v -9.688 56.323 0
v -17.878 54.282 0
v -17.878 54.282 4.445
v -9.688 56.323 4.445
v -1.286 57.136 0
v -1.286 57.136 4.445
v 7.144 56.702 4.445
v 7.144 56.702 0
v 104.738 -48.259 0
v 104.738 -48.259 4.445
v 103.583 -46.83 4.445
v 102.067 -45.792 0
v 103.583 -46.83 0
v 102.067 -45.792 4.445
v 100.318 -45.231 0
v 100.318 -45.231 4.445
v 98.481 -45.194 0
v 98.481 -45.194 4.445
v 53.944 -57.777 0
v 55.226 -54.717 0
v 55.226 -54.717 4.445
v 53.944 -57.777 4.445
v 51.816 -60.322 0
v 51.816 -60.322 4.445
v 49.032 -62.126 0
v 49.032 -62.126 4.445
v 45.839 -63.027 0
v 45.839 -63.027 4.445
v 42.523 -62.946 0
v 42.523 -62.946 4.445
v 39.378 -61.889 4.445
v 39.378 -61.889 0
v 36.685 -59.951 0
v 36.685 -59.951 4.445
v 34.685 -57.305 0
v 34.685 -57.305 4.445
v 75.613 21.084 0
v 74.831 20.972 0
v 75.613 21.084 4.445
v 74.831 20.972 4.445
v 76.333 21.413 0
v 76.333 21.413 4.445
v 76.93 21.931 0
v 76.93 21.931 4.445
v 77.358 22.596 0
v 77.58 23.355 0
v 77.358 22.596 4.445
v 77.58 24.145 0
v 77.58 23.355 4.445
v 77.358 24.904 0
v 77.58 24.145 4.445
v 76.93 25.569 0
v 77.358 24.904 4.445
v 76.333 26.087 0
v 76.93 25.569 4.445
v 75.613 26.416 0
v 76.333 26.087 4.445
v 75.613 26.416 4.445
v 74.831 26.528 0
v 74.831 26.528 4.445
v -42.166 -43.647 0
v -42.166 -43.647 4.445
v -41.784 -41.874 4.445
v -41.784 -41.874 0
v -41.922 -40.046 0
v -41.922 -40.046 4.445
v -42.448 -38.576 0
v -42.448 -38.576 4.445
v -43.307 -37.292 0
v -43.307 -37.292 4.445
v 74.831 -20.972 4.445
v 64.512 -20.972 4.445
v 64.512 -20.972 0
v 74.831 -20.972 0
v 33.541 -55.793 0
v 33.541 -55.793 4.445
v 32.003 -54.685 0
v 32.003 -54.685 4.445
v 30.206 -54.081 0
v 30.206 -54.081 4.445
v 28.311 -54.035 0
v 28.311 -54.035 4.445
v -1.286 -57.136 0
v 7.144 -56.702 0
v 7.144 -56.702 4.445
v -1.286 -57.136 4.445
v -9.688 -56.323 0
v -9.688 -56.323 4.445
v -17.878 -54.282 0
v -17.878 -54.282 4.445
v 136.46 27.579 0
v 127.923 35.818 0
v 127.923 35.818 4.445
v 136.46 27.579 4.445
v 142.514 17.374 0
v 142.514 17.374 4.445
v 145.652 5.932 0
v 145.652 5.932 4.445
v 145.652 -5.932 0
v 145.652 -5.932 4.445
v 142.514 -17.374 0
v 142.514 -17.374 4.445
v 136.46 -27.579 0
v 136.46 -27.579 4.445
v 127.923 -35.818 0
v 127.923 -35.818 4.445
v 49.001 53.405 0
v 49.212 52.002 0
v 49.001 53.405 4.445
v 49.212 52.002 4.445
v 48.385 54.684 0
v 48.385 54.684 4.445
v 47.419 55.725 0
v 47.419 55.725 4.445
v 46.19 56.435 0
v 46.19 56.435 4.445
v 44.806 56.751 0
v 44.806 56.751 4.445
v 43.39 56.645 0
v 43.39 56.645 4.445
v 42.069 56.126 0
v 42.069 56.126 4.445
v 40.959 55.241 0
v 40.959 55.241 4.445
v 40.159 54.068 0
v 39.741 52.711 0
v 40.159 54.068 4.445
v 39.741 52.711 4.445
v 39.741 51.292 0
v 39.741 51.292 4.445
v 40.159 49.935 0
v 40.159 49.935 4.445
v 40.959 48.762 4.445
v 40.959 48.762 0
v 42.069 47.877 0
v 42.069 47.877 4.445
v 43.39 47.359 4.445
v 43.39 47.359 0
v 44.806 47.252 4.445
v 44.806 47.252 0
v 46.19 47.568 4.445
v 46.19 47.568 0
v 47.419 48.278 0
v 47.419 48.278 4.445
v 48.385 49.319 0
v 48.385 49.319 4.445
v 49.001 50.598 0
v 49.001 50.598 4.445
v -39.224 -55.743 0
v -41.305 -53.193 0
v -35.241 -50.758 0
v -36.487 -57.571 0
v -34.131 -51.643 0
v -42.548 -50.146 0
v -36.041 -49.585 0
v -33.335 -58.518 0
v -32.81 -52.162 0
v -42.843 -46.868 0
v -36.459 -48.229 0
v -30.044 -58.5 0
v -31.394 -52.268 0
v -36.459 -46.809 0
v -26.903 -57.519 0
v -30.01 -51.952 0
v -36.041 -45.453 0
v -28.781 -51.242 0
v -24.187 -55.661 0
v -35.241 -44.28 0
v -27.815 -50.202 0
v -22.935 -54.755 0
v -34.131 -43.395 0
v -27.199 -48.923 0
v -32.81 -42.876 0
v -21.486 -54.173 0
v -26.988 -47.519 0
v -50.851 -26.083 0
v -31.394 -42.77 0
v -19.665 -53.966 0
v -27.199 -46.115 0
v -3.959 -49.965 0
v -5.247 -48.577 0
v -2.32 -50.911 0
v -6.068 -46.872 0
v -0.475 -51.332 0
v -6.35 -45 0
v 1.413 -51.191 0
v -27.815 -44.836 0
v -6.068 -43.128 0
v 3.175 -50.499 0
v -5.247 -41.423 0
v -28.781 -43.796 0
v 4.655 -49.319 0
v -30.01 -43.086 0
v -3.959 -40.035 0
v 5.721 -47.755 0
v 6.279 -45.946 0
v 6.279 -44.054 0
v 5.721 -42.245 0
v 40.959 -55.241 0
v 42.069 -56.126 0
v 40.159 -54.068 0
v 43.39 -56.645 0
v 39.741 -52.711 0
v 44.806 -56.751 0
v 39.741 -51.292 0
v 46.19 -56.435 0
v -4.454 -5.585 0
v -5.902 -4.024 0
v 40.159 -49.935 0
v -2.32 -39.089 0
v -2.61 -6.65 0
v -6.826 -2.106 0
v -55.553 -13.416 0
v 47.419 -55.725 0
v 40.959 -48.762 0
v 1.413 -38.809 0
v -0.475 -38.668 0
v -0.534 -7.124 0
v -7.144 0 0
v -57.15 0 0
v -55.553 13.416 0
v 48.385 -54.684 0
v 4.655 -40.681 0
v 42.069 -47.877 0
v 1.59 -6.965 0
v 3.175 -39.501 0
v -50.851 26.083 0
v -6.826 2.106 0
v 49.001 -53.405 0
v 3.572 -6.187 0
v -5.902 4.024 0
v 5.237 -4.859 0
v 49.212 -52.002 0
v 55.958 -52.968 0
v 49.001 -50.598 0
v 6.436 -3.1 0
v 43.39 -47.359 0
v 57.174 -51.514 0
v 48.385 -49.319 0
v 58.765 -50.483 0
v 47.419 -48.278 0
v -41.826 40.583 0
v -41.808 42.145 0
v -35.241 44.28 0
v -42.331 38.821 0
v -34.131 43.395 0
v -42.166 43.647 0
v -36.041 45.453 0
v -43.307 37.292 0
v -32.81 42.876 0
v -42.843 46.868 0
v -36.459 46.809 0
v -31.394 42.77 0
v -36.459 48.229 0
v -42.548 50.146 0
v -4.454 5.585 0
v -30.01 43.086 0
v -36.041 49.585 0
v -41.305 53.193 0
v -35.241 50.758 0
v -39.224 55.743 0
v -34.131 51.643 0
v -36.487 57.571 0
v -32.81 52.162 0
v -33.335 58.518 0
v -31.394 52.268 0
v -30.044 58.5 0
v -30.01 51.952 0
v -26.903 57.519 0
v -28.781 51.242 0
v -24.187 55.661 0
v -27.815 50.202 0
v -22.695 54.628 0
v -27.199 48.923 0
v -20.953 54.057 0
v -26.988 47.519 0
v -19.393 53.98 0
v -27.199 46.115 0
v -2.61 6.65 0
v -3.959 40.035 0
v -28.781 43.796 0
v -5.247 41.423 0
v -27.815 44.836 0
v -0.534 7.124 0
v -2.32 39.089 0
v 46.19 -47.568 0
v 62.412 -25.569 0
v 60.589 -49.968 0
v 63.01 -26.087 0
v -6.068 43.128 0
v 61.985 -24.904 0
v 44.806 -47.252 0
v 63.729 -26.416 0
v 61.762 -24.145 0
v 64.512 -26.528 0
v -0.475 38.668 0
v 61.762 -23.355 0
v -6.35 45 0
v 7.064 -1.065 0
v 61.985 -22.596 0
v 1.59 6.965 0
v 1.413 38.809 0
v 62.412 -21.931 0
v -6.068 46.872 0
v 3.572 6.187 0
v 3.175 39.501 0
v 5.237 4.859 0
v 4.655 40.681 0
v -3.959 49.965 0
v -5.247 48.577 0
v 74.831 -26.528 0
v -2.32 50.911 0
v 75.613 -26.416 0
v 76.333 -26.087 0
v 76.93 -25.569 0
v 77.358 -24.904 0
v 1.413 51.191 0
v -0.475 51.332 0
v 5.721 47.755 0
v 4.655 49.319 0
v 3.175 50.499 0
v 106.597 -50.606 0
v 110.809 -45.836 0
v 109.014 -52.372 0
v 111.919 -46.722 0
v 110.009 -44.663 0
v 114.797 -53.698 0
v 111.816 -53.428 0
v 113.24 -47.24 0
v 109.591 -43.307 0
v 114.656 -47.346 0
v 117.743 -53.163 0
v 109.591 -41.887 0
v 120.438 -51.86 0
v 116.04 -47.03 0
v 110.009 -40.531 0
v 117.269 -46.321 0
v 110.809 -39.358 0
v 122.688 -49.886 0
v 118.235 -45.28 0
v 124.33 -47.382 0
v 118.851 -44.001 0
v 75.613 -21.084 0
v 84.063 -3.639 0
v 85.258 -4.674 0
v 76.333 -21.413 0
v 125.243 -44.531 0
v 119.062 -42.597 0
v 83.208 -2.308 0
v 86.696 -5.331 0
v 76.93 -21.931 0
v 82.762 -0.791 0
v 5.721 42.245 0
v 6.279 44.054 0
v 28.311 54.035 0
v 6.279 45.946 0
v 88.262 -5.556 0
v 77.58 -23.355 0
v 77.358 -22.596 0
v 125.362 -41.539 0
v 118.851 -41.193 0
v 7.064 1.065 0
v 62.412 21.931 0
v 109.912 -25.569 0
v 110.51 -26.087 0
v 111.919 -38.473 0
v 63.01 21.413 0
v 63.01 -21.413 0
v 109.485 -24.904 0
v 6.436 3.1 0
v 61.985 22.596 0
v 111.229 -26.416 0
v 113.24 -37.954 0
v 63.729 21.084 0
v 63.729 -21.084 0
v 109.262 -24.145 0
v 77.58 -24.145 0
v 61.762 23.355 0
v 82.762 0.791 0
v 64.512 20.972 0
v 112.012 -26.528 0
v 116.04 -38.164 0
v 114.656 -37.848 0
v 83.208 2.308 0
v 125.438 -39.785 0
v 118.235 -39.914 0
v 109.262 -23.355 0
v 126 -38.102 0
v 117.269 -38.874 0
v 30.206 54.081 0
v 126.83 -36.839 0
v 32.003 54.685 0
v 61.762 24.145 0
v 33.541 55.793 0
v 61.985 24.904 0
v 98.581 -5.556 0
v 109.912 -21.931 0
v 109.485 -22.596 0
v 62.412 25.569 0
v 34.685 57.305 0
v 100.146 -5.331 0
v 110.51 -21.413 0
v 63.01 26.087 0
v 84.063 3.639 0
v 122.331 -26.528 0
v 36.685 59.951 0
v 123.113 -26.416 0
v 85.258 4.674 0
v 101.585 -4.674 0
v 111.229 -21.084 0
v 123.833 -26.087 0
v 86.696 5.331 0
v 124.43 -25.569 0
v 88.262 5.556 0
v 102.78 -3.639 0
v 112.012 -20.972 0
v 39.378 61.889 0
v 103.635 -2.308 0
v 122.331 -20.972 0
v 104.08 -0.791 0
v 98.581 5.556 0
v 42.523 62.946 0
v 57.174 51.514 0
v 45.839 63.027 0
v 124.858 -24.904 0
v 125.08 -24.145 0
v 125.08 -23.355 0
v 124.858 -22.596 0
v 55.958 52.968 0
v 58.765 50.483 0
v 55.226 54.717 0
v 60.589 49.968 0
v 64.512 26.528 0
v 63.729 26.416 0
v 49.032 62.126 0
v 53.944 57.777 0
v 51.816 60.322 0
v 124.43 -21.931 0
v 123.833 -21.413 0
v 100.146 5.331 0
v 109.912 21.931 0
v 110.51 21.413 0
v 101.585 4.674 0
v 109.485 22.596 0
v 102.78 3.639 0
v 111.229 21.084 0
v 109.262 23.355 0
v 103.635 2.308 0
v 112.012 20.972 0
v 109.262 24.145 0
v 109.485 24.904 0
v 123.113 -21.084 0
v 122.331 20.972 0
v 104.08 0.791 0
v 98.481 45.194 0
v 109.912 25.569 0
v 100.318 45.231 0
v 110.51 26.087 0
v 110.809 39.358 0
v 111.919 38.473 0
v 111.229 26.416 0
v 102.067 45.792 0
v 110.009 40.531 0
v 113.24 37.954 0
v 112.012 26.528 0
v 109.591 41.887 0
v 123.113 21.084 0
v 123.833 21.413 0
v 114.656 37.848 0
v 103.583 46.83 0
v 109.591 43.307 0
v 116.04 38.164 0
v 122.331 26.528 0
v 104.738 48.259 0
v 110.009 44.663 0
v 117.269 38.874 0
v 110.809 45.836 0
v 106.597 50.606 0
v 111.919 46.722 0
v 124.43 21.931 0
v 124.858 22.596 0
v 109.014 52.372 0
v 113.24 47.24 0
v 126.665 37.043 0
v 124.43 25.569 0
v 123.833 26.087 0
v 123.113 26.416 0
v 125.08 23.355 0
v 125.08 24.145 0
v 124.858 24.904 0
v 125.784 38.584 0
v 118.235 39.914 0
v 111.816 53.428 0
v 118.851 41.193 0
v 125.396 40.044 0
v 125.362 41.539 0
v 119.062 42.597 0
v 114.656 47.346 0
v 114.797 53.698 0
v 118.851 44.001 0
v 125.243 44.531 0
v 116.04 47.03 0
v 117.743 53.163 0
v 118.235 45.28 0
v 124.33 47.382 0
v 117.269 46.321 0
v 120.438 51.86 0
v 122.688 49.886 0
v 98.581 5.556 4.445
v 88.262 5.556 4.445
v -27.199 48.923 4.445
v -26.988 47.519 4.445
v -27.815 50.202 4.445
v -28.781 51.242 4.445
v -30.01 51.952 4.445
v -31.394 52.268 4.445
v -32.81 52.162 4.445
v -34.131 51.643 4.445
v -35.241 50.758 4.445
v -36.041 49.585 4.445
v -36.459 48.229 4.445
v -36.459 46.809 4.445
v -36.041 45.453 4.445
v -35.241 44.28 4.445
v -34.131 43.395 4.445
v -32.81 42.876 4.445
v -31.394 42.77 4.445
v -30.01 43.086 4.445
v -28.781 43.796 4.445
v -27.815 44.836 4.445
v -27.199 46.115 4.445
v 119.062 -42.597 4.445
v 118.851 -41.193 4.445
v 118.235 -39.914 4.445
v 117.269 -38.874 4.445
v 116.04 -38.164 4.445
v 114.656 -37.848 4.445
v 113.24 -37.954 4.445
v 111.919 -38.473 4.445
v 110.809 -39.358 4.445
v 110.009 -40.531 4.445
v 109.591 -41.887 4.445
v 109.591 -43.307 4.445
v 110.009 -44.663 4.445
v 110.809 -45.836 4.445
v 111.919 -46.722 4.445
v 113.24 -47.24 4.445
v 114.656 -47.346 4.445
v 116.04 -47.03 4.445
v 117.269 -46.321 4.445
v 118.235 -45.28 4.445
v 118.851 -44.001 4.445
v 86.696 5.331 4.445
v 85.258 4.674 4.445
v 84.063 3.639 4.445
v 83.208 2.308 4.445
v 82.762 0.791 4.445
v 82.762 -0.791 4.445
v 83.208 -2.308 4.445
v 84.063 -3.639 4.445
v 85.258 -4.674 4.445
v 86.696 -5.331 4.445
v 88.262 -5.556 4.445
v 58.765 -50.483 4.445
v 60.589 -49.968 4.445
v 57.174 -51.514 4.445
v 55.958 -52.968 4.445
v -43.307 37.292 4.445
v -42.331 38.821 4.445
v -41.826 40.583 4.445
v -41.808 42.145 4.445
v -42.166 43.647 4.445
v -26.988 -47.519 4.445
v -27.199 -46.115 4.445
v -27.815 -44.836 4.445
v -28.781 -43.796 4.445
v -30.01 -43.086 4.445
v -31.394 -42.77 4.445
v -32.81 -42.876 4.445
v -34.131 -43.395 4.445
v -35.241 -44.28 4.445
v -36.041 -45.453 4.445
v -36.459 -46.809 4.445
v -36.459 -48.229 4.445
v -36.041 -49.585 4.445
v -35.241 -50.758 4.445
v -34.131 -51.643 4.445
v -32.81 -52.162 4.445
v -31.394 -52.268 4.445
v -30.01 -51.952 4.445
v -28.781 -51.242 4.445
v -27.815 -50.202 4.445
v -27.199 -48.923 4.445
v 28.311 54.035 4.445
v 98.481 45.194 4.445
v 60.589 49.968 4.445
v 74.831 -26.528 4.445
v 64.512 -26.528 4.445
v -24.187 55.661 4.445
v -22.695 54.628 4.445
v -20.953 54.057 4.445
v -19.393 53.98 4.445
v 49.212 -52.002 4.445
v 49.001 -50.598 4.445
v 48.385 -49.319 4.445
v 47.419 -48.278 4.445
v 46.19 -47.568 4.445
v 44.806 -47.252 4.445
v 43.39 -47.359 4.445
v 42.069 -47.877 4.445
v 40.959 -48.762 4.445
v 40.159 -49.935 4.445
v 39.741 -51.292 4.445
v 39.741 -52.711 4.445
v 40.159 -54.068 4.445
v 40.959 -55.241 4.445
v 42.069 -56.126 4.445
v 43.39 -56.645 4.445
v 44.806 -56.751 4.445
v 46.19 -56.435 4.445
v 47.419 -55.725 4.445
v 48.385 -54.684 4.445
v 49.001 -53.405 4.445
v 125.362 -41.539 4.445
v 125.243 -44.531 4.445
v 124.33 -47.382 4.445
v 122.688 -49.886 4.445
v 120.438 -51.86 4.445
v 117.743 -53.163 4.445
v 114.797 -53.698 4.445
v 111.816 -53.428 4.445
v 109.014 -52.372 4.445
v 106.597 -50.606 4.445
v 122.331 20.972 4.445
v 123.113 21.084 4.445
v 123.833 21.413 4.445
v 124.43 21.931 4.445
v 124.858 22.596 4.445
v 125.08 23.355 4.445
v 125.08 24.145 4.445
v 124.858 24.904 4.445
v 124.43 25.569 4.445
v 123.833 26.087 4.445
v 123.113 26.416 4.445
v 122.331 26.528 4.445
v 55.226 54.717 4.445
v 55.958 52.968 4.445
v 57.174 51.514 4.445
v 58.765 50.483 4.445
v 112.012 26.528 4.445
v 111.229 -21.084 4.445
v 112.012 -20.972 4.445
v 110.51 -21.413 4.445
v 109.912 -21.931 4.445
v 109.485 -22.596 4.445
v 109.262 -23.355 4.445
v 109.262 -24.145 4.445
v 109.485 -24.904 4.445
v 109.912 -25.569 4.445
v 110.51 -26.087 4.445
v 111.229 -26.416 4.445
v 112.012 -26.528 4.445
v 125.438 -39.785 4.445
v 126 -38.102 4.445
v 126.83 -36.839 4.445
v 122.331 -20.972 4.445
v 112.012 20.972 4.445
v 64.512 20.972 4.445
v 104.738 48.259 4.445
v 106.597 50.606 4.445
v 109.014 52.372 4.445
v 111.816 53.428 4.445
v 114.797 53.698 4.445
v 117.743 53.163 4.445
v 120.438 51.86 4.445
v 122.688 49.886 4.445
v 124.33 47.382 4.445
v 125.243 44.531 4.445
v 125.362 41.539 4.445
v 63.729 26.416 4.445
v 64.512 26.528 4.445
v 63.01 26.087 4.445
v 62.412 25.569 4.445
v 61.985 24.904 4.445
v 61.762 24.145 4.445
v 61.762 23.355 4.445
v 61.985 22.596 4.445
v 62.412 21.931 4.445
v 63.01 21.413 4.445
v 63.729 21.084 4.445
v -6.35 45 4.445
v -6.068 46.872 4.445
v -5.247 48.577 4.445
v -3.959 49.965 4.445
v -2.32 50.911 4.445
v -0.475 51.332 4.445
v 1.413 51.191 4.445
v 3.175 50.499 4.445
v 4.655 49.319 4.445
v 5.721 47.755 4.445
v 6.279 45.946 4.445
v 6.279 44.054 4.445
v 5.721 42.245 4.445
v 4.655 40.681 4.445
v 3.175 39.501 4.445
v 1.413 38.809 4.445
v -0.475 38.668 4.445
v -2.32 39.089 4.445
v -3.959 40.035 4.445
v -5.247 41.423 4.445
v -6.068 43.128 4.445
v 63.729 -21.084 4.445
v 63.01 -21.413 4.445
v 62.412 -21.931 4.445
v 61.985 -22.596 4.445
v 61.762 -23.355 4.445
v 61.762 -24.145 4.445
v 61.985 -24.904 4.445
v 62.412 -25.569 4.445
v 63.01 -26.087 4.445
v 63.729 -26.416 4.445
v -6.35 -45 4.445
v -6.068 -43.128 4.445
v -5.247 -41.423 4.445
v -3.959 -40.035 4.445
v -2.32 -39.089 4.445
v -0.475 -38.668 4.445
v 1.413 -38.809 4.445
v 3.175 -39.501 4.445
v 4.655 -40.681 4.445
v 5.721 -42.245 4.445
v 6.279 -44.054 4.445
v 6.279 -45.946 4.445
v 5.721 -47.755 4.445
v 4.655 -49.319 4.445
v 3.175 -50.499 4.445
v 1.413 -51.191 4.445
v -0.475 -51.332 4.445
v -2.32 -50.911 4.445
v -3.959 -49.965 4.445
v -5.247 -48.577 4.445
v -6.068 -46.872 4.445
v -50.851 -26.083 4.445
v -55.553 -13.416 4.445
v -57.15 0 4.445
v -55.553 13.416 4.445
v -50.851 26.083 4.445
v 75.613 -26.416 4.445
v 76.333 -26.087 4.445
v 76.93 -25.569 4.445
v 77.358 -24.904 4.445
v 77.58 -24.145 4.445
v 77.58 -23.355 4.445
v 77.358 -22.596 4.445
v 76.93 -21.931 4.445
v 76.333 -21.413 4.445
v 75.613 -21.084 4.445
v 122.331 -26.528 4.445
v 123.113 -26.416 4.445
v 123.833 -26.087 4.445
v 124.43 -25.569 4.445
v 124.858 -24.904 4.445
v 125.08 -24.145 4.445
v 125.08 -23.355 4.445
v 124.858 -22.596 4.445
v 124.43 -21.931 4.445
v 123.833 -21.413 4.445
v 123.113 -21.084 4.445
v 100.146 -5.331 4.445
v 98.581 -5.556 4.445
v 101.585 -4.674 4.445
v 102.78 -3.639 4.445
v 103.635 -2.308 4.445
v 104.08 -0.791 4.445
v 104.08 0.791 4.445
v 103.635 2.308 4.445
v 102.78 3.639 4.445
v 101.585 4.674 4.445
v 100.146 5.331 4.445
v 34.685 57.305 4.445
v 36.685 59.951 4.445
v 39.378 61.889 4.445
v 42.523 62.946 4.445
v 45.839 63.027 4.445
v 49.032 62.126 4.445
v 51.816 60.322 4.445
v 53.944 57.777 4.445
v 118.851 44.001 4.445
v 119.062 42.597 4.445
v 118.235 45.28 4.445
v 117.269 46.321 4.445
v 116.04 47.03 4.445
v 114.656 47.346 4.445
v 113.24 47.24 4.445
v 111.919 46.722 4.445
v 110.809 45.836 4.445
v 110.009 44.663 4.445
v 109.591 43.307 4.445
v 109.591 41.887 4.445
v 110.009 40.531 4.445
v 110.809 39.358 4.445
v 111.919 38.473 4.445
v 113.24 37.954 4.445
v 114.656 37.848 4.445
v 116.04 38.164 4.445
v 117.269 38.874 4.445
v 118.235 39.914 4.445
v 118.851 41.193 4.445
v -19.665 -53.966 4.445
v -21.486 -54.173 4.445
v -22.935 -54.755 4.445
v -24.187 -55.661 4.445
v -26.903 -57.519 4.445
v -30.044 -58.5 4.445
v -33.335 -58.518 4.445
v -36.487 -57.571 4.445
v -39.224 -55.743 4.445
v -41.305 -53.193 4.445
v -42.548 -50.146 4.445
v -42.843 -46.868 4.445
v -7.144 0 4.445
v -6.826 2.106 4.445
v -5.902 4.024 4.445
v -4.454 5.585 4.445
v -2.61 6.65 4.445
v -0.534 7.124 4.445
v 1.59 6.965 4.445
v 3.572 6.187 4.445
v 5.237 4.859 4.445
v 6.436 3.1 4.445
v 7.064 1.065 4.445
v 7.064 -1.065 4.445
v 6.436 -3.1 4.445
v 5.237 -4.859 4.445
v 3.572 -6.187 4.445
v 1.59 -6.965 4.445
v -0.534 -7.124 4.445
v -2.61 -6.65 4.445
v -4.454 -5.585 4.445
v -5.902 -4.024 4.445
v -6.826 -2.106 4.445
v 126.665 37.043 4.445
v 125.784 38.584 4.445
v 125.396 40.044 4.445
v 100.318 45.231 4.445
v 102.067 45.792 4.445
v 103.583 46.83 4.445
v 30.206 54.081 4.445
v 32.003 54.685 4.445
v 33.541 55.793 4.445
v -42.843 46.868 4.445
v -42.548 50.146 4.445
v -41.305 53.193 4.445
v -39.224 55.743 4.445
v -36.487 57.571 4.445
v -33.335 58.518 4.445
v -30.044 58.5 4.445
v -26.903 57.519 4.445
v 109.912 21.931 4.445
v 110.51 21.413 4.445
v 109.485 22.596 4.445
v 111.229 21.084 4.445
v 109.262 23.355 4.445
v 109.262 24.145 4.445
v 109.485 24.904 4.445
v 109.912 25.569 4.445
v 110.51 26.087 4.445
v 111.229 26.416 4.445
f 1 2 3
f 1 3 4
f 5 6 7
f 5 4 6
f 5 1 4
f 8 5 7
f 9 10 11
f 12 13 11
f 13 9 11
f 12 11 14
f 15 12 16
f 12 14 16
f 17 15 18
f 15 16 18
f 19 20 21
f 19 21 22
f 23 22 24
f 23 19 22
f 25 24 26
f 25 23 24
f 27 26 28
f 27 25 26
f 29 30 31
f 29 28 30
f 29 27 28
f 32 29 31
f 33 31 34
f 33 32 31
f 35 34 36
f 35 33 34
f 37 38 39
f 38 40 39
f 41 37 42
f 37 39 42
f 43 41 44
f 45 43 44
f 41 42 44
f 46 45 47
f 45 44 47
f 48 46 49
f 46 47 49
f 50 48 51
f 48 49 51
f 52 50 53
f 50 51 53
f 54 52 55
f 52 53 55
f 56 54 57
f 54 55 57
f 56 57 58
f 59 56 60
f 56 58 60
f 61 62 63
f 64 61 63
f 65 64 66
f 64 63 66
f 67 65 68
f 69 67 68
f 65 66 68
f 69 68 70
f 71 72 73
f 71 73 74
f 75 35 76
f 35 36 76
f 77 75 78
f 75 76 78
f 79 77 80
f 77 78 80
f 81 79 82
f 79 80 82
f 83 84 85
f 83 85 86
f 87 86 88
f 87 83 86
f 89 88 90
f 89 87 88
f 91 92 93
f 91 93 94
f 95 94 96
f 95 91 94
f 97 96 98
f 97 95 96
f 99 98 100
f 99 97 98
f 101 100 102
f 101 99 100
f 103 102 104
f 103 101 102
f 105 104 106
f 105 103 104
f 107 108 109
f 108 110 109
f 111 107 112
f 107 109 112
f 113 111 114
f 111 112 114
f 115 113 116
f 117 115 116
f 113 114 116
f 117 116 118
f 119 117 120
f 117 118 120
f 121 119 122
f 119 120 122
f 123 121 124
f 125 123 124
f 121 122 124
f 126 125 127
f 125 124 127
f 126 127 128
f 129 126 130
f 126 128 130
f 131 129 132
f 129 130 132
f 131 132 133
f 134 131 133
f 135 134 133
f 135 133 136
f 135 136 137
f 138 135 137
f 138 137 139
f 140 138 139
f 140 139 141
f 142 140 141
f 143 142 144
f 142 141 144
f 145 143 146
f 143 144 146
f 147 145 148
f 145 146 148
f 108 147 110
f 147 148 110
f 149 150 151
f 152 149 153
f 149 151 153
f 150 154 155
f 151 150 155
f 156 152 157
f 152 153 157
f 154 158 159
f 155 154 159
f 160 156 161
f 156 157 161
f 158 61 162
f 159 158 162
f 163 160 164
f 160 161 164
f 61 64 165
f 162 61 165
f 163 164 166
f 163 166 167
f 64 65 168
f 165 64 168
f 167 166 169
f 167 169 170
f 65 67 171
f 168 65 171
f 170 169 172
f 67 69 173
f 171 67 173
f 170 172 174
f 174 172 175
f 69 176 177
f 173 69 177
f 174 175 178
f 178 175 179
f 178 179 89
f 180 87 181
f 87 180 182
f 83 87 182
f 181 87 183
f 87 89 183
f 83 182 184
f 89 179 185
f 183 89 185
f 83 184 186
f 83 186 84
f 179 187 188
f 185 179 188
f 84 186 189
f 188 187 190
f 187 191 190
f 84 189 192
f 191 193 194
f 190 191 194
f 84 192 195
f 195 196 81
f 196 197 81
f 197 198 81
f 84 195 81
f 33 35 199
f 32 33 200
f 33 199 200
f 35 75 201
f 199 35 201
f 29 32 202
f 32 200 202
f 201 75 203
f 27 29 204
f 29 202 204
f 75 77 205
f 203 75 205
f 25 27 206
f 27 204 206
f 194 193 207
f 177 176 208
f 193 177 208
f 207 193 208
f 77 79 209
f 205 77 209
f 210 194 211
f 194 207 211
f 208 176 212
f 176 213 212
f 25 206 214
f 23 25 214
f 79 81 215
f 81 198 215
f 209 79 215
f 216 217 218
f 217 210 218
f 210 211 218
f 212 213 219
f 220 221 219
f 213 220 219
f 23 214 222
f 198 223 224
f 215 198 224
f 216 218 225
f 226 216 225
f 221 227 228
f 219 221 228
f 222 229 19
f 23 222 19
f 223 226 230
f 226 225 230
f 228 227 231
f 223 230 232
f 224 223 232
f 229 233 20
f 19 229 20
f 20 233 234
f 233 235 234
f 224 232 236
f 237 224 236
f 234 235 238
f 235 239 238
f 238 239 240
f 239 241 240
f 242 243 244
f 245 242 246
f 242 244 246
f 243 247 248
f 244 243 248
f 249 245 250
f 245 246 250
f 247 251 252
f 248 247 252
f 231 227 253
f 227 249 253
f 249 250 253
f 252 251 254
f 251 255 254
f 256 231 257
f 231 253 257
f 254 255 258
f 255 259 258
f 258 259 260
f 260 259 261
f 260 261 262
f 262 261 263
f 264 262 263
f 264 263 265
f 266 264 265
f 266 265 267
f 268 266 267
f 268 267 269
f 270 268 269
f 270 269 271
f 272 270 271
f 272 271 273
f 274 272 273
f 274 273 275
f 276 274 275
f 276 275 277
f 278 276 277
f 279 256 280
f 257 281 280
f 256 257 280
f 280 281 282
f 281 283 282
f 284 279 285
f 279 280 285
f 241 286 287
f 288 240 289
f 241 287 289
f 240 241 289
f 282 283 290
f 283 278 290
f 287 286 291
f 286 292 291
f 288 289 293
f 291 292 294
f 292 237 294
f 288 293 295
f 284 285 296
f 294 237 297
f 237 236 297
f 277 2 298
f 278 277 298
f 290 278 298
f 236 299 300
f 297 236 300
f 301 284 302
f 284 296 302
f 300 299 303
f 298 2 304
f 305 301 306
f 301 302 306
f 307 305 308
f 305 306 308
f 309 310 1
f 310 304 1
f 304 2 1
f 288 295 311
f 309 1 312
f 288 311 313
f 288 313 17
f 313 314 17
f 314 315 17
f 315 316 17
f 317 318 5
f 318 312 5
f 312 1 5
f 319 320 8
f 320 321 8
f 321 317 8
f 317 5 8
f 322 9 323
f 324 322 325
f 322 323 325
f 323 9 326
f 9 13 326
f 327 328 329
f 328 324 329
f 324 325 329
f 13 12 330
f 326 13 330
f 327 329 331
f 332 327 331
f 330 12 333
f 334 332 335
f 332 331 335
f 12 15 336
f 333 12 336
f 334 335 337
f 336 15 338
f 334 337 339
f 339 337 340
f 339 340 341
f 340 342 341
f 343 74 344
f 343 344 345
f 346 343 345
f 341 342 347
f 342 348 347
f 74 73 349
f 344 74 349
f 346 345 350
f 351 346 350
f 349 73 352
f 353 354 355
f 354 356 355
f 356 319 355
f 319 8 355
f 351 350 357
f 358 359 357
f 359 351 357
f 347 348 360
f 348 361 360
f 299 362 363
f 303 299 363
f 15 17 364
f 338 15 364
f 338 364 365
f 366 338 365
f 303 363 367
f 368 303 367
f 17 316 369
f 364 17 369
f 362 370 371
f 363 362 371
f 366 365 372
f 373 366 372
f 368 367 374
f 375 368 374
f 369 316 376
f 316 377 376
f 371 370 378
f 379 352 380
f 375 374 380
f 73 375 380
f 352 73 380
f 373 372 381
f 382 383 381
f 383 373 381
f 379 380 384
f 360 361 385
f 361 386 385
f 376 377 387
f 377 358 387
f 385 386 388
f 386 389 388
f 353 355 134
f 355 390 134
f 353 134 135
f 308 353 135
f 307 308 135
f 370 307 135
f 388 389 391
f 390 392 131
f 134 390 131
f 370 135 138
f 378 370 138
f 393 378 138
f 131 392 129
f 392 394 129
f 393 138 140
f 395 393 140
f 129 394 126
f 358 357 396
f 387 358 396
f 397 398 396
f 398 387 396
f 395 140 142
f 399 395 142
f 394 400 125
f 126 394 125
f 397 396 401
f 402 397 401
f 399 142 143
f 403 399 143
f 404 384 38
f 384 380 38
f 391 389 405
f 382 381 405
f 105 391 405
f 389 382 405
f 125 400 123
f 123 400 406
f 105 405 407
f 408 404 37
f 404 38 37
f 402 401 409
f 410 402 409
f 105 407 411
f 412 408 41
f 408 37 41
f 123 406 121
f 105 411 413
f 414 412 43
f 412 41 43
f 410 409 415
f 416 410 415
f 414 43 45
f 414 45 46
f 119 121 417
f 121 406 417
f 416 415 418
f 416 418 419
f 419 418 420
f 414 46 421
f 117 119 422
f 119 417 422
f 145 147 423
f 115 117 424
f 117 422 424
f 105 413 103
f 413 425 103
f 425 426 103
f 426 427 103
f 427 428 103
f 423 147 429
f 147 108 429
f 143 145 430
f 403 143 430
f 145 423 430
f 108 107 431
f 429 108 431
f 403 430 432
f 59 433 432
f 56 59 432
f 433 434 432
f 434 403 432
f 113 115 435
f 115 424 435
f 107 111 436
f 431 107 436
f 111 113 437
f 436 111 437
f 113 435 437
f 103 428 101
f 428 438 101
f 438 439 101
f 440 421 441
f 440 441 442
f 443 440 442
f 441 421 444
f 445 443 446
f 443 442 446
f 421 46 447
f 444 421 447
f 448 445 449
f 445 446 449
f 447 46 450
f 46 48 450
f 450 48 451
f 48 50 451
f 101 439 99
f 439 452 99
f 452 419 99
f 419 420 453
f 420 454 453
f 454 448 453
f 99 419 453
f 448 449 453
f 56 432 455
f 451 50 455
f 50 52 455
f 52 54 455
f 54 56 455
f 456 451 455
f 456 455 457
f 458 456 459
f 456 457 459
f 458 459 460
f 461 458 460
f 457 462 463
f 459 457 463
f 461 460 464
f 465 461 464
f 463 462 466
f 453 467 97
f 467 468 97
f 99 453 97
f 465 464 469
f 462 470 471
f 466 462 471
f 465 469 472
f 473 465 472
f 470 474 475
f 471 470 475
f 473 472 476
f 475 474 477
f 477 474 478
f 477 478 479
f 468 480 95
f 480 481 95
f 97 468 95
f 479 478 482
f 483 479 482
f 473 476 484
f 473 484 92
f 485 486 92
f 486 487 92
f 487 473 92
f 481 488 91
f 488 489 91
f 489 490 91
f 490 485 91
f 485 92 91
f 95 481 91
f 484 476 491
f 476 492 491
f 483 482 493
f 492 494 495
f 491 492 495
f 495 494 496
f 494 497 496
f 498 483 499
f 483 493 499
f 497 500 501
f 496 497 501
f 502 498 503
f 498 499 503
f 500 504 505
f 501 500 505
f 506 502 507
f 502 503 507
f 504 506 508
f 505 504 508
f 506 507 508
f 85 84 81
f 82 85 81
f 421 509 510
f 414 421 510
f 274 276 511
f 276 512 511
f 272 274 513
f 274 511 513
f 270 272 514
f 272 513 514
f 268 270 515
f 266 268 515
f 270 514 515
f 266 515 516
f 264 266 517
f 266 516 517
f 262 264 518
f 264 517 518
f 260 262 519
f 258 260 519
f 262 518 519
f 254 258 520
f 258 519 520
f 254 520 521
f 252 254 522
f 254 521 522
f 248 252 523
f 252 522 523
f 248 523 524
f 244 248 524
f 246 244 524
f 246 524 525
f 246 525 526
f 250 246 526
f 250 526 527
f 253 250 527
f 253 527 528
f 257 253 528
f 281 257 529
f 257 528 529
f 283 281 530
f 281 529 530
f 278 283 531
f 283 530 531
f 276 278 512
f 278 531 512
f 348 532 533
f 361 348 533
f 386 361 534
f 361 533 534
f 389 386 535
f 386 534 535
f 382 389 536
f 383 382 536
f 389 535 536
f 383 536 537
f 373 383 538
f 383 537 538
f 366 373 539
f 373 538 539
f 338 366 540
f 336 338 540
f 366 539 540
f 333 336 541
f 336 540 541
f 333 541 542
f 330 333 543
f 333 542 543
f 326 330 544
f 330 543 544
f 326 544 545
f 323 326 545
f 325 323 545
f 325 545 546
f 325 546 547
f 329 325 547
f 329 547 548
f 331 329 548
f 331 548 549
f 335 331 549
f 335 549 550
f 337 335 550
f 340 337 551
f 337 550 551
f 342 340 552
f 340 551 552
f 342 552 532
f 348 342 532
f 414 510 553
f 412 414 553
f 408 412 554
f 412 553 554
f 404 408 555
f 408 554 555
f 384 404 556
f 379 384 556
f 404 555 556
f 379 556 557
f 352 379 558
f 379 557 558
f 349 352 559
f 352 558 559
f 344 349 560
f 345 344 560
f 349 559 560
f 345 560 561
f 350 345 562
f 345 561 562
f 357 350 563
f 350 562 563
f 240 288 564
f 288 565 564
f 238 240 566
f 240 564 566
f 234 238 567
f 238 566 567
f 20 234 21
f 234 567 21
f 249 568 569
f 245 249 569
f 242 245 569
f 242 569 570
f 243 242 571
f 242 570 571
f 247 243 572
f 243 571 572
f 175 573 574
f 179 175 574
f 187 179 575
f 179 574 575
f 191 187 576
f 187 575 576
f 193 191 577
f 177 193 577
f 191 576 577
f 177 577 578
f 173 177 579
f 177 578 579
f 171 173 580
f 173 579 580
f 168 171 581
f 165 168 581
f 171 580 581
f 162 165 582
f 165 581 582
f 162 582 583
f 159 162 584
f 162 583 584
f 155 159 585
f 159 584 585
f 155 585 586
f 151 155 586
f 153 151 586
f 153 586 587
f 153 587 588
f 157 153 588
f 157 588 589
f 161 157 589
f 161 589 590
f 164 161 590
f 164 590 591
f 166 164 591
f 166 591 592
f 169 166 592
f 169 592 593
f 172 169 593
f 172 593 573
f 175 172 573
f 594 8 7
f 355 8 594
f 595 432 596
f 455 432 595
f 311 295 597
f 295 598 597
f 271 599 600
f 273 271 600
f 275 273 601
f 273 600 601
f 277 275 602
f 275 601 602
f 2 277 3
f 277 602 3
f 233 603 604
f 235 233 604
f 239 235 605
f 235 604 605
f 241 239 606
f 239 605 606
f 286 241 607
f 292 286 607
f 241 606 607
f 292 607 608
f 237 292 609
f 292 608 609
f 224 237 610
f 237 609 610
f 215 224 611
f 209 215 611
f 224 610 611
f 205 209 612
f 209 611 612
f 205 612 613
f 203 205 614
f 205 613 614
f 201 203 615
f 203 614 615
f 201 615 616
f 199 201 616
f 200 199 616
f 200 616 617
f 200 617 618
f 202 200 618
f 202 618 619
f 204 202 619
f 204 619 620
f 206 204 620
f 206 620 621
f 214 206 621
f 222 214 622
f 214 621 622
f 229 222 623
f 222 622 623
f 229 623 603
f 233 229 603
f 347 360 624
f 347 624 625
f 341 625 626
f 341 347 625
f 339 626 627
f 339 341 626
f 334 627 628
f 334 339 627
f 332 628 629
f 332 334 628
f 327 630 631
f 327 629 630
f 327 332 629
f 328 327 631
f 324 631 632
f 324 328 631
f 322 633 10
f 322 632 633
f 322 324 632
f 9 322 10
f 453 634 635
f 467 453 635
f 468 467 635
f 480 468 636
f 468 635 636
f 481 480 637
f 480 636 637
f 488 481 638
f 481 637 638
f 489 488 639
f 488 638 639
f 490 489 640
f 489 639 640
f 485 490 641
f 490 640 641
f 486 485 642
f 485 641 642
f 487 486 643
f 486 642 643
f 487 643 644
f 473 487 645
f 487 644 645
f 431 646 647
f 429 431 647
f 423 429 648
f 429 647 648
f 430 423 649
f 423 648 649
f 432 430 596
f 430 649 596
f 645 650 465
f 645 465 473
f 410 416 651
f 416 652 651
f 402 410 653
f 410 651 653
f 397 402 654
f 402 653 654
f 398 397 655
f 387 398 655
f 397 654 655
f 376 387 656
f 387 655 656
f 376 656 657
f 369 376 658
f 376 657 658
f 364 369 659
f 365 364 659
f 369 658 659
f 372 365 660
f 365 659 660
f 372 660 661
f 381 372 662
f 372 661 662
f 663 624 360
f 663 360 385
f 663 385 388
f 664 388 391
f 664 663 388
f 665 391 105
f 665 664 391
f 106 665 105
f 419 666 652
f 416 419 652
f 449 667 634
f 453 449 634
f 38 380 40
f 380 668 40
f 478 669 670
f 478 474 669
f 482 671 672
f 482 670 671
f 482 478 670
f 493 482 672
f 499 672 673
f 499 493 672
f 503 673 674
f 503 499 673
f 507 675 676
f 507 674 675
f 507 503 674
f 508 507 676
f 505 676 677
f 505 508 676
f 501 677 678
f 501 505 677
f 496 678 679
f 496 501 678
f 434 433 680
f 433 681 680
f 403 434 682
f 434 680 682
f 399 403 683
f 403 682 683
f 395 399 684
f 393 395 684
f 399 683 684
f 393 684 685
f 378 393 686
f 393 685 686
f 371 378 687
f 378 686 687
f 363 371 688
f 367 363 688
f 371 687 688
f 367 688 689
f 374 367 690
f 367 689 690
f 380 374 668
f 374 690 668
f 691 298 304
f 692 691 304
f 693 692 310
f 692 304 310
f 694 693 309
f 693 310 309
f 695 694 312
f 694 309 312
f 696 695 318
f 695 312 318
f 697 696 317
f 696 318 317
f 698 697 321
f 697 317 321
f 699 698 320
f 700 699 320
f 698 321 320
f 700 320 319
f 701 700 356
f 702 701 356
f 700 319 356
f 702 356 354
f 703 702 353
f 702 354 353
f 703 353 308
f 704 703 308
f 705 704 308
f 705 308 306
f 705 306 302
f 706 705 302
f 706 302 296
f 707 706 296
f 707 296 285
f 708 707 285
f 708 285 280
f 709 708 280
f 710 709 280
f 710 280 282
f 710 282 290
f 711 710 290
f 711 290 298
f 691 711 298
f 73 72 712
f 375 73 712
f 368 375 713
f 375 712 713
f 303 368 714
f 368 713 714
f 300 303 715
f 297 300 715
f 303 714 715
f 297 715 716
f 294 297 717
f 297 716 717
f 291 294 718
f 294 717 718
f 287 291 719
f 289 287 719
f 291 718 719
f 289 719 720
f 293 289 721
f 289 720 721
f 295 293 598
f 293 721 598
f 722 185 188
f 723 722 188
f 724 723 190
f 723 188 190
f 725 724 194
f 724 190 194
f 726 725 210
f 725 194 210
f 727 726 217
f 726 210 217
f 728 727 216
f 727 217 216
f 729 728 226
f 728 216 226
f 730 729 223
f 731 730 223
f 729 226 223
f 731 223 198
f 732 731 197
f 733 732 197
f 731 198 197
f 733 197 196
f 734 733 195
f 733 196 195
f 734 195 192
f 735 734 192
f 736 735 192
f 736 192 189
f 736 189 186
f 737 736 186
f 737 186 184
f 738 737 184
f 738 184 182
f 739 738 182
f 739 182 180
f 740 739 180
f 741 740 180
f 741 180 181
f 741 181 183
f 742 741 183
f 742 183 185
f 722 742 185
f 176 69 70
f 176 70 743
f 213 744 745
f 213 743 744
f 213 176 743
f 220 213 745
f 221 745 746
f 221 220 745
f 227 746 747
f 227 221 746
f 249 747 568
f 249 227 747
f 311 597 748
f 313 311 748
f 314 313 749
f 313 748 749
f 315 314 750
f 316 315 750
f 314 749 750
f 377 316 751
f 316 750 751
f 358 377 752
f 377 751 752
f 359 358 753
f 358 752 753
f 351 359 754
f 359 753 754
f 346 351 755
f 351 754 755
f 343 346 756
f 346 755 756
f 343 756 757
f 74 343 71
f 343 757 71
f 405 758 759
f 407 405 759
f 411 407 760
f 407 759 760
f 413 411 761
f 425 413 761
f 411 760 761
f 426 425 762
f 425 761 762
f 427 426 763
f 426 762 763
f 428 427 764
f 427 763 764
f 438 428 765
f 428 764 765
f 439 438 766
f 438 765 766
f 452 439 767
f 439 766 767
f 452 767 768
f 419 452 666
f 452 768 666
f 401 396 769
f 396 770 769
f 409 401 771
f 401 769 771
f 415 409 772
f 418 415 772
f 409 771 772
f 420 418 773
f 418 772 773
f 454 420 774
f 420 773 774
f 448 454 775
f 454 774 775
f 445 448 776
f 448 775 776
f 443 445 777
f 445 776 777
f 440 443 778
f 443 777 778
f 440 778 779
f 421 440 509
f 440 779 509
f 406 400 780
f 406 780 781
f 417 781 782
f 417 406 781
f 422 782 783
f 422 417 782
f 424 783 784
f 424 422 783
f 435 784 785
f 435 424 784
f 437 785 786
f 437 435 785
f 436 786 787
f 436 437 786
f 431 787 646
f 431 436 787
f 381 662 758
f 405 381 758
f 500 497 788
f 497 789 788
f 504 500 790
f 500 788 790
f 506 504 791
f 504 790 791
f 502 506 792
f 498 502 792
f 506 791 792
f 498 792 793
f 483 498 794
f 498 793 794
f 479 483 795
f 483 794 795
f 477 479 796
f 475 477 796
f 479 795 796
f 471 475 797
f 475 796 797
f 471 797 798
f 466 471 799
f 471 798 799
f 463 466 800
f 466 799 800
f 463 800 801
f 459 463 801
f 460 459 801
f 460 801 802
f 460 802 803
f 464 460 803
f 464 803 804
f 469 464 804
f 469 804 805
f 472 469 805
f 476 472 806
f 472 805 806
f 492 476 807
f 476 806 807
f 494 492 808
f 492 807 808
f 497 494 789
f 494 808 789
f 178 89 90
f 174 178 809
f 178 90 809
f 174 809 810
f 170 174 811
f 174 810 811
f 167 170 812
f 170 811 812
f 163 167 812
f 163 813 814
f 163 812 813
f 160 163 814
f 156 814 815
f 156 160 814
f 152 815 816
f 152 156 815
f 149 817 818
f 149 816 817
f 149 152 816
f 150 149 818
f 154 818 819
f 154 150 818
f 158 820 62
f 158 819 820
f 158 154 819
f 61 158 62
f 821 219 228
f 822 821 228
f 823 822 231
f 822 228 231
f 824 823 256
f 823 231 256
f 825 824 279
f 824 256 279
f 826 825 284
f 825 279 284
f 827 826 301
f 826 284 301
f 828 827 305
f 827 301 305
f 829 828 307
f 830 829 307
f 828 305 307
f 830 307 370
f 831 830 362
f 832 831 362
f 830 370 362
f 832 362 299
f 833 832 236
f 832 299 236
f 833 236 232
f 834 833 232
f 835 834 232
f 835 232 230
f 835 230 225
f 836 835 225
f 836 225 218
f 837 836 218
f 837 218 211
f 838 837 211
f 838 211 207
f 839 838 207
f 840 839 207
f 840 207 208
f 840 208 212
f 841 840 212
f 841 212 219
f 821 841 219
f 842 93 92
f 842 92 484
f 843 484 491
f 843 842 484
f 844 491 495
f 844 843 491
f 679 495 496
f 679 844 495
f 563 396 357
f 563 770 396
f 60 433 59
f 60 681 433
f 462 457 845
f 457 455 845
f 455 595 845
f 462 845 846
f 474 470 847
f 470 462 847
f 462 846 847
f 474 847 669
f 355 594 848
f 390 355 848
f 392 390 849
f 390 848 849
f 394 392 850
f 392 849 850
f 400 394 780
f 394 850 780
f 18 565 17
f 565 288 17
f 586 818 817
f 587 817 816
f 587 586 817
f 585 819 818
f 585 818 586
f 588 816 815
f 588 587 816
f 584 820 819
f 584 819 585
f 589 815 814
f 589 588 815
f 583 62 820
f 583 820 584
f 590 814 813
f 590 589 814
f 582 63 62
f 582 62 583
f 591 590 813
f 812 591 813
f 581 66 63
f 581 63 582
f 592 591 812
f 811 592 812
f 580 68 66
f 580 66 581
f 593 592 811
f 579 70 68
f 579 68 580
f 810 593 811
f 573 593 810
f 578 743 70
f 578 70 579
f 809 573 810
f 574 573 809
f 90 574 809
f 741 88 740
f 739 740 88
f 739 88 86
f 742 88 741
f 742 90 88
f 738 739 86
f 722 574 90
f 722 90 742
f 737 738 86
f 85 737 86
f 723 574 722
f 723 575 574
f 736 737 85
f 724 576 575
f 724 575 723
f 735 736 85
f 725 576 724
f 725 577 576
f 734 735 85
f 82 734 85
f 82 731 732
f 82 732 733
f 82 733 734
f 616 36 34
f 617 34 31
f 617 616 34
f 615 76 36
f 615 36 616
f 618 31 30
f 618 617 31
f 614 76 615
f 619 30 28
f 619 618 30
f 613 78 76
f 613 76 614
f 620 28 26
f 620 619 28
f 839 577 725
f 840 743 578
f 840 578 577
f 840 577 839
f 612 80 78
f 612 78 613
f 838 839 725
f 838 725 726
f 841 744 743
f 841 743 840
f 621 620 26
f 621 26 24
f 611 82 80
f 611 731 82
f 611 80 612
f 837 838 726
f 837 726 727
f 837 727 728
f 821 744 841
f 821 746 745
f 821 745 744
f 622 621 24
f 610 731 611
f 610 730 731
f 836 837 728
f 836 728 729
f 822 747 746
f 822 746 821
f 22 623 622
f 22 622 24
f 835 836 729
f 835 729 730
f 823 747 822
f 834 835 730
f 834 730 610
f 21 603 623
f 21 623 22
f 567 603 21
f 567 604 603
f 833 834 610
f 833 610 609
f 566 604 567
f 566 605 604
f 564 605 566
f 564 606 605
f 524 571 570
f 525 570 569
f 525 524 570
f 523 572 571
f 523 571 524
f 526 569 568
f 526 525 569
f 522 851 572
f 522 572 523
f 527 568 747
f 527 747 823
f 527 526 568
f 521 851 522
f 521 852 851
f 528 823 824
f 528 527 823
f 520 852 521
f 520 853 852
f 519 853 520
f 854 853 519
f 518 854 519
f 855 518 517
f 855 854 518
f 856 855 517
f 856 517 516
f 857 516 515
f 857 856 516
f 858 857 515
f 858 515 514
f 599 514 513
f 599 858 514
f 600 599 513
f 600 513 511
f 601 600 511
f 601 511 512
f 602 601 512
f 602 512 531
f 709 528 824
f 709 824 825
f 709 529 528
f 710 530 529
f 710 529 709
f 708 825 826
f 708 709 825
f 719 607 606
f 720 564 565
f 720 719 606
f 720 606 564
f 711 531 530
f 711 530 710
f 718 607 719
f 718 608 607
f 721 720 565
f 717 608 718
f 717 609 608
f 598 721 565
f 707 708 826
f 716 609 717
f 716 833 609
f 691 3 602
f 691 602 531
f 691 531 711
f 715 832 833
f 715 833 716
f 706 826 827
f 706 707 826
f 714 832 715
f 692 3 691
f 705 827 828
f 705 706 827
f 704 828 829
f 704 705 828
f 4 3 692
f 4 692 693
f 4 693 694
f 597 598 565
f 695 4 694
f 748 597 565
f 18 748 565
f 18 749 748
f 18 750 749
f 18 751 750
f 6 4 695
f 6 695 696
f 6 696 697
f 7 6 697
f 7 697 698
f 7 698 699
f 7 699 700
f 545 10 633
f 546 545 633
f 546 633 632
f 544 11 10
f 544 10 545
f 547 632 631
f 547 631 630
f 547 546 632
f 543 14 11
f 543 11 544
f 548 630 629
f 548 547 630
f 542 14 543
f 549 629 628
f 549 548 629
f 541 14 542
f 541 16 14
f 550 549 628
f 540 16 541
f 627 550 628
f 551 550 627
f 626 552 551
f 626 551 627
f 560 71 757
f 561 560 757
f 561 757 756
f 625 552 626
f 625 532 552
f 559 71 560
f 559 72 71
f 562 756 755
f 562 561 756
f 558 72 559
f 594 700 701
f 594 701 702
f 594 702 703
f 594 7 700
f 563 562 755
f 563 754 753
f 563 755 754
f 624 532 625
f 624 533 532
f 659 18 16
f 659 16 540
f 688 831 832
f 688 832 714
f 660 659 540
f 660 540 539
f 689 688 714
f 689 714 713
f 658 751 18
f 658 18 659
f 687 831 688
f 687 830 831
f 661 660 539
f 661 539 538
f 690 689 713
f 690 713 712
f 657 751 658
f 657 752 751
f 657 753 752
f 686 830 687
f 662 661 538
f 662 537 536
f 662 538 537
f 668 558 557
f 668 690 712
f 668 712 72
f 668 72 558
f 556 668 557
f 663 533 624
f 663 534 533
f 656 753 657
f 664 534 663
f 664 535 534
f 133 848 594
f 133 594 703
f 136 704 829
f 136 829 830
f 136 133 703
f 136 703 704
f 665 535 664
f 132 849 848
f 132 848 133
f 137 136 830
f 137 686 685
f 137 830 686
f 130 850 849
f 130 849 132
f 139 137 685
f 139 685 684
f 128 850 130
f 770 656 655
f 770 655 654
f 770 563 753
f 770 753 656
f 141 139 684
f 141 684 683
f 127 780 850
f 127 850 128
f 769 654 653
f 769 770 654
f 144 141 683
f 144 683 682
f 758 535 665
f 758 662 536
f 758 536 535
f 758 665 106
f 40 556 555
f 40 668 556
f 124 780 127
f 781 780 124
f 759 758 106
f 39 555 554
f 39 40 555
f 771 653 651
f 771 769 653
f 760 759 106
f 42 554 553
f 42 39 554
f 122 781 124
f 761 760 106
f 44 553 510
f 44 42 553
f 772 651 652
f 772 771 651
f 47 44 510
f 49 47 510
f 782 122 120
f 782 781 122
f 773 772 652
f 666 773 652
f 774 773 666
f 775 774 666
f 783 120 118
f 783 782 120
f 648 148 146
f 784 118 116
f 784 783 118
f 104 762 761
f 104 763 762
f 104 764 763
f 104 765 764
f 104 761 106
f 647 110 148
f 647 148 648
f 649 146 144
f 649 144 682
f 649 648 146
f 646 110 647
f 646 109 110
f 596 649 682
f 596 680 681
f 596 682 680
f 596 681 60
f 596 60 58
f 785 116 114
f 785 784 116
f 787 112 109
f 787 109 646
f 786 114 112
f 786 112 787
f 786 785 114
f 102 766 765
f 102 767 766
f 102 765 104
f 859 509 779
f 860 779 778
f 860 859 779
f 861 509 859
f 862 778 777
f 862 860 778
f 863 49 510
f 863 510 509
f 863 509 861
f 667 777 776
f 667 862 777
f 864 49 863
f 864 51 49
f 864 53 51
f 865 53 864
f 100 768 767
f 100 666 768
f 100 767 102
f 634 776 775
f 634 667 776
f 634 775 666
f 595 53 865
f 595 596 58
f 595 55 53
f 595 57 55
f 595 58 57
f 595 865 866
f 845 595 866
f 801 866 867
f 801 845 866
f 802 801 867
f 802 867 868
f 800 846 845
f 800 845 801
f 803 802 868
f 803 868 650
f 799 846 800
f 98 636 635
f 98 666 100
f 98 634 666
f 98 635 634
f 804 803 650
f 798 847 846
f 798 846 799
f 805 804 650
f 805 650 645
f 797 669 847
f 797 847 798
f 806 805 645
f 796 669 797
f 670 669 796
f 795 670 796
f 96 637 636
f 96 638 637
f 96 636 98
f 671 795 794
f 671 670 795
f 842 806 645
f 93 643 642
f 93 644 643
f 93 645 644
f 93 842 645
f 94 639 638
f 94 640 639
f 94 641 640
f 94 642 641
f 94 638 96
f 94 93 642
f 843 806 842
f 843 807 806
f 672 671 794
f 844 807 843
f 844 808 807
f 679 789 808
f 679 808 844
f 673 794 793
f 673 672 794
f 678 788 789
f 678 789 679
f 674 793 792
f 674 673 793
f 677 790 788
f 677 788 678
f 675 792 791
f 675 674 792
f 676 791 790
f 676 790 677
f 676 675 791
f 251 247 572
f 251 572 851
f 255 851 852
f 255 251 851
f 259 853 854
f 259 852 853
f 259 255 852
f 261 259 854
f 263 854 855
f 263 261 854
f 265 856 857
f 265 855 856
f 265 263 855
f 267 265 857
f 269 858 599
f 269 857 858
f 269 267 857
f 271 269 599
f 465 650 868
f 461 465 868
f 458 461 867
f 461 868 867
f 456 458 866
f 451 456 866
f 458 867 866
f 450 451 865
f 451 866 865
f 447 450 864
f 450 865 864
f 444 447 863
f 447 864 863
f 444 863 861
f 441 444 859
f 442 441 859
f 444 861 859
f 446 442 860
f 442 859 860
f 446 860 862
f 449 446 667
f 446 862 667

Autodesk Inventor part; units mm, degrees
ref_plane "YZ Plane" through (0, 0, 0) normal (1, 0, 0) x (0, 1, 0)
ref_plane "XZ Plane" through (0, 0, 0) normal (0, 1, 0) x (-1, 0, 0)
ref_plane "XY Plane" through (0, 0, 0) normal (0, 0, 1) x (1, 0, 0)
sketch "Boceto1" plane through (0, 0, 0) normal (0, 0, 1) x (1, 0, 0)
  circle A0 centre (0, 0) radius 57.15
  circle A1 centre (101.6, 0) radius 44.45
  circle A2 centre (-31.75, 47.519) radius 11.1125
  circle A3 centre (-31.75, -47.519) radius 11.1125
  circle A4 centre (114.3, 42.5971) radius 11.1125
  circle A5 centre (114.3, -42.5971) radius 11.1125
  line L0 (7.1437, 56.7018) -> (107.1562, 44.1014)
  circle A6 centre (44.45, 52.0016) radius 11.1125
  line L1 (7.1437, -56.7018) -> (107.1562, -44.1014)
  circle A7 centre (44.45, -52.0016) radius 11.1125
  dimension "d0" = 114.3
  dimension "d1" = 88.9
  dimension "d2" = 203.2
  dimension "d3" = 22.225
  dimension "d4" = 22.225
  dimension "d7" = 22.225
  dimension "d8" = 22.225
  dimension "d11" = 22.225
  dimension "d13" = 0
  dimension "d14" = 22.225
  dimension "d27" = 12.7
  dimension "d28" = 12.7
  dimension "d29" = 44.45
  dimension "d30" = 44.45
  dimension "d31" = 31.75
  dimension "d32" = 31.75
extrude "Extrusión1" add sketch "Boceto1" along normal blind 4.445
sketch "Boceto2" plane through (0, 0, 4.445) normal (0, 0, 1) x (1, 0, 0)
  arc A0 (-21.9537, 52.7651) -> (-40.3458, 40.4764) centre (-31.75, 47.519) ccw projected
  circle A1 centre (-31.75, 47.519) radius 4.7625
  arc A2 (-40.3458, -40.4764) -> (-21.9537, -52.7651) centre (-31.75, -47.519) ccw projected
  circle A3 centre (-31.75, -47.519) radius 4.7625
  arc A4 (33.4247, -53.3907) -> (55.4753, -50.6125) centre (44.45, -52.0016) ccw projected
  circle A5 centre (44.45, -52.0016) radius 4.7625
  arc A6 (55.4753, 50.6125) -> (33.4247, 53.3907) centre (44.45, 52.0016) ccw projected
  circle A7 centre (44.45, 52.0016) radius 4.7625
  arc A8 (124.4689, 38.1158) -> (103.3657, 44.5789) centre (114.3, 42.5971) ccw projected
  circle A9 centre (114.3, 42.5971) radius 4.7625
  arc A10 (103.3657, -44.5789) -> (124.4689, -38.1158) centre (114.3, -42.5971) ccw projected
  circle A11 centre (114.3, -42.5971) radius 4.7625
  point P0 (0, 0)
  dimension "d18" = 9.525
  dimension "d19" = 9.525
  dimension "d20" = 9.525
  dimension "d21" = 9.525
  dimension "d22" = 9.525
  dimension "d23" = 9.525
extrude "Extrusión2" cut sketch "Boceto2" against normal up to surface (4.445 mm away)
fillet "Empalme1" radius 6.35 12 edges at (-21.9537, -52.7651, 2.2225) (-40.3458, -40.4764, 2.2225) (33.4247, -53.3907, 2.2225) (55.4753, -50.6125, 2.2225) (124.4689, -38.1158, 2.2225) (-40.3458, 40.4764, 2.2225) (-21.9537, 52.7651, 2.2225) (33.4247, 53.3907, 2.2225) (55.4753, 50.6125, 2.2225) (103.3657, 44.5789, 2.2225) (124.4689, 38.1158, 2.2225) (103.3657, -44.5789, 2.2225)
sketch "Boceto3" plane through (0, 0, 0) normal (0, 0, -1) x (-1, 0, 0)
  circle A0 centre (0, 0) radius 7.1437
  circle A1 centre (0, -45) radius 6.35
  circle A2 centre (0, 45) radius 6.35
  line L0 (0, -45) -> (0, 0)
  line L1 (0, 0) -> (0, 45)
  dimension "d33" = 14.2875
  dimension "d34" = 12.7
  dimension "d35" = 12.7
  dimension "d36" = 45
  dimension "d37" = 45
extrude "Extrusión3" cut sketch "Boceto3" against normal up to surface (4.445 mm away)
sketch "Boceto4" plane through (0, 0, 4.445) normal (0, 0, 1) x (1, 0, 0)
  circle A0 centre (93.4212, 0) radius 5.5563
  line L0 (65.4212, -28) -> (121.4212, -28)
  line L1 (121.4212, -28) -> (121.4212, 28)
  line L2 (121.4212, 28) -> (65.4212, 28)
  line L3 (65.4212, 28) -> (65.4212, -28)
  line L4 (69.6712, -23.75) -> (117.1712, -23.75)
  line L5 (117.1712, -23.75) -> (117.1712, 23.75)
  line L6 (117.1712, 23.75) -> (69.6712, 23.75)
  line L7 (69.6712, 23.75) -> (69.6712, -23.75)
  circle A1 centre (74.8306, -23.75) radius 2.7781
  circle A2 centre (112.0118, -23.75) radius 2.7781
  circle A3 centre (122.3306, -23.75) radius 2.7781
  circle A4 centre (64.5118, -23.75) radius 2.7781
  line L8 (64.5118, -26.5281) -> (74.8306, -26.5281)
  line L9 (64.5118, -20.9719) -> (74.8306, -20.9719)
  line L10 (112.0118, -26.5281) -> (122.3306, -26.5281)
  line L11 (122.3306, -20.9719) -> (112.0118, -20.9719)
  circle A5 centre (74.8306, 23.75) radius 2.7781
  circle A6 centre (64.5118, 23.75) radius 2.7781
  line L12 (64.5118, 20.9719) -> (74.8306, 20.9719)
  line L13 (64.5118, 26.5281) -> (74.8306, 26.5281)
  circle A7 centre (112.0118, 23.75) radius 2.7781
  circle A8 centre (122.3306, 23.75) radius 2.7781
  line L14 (112.0118, 20.9719) -> (122.3306, 20.9719)
  line L15 (112.0118, 26.5281) -> (122.3306, 26.5281)
  circle A9 centre (98.5806, 0) radius 5.5563
  circle A10 centre (88.2618, 0) radius 5.5563
  line L16 (98.5806, 5.5563) -> (88.2618, 5.5563)
  line L17 (98.5806, -5.5563) -> (88.2618, -5.5563)
  point P0 (0, 0)
  dimension "d40" = 11.1125
  dimension "d41" = 56
  dimension "d42" = 56
  dimension "d43" = 28
  dimension "d44" = 28
  dimension "d45" = 0
  dimension "d46" = 93.4212
  dimension "d47" = 47.5
  dimension "d48" = 47.5
  dimension "d49" = 23.75
  dimension "d50" = 23.75
  dimension "d57" = 5.5563
  dimension "d58" = 5.1594
  dimension "d59" = 5.5563
  dimension "d60" = 5.5563
  dimension "d61" = 5.1594
  dimension "d62" = 5.1594
  dimension "d63" = 5.5563
  dimension "d64" = 5.1594
  dimension "d65" = 0
  dimension "d66" = 5.5563
  dimension "d67" = 5.5563
  dimension "d68" = 5.1594
  dimension "d69" = 5.1594
  dimension "d70" = 0
  dimension "d71" = 5.5563
  dimension "d72" = 5.5563
  dimension "d73" = 5.1594
  dimension "d74" = 5.1594
  dimension "d75" = 0
  dimension "d78" = 11.1125
  dimension "d79" = 11.1125
  dimension "d80" = 5.1594
  dimension "d81" = 5.1594
extrude "Extrusión4" cut sketch "Boceto4" against normal up to next contours A0 A9 A10 | A0 A9 | A9 A10 A0 | A0 L16 A9 | A9 L17 A0 | A0 A10 A9 | A0 A10 L16 | A10 A9 | A9 A10 A0 | L17 A10 A0 | A0 A10 | L8 A4 L3 | L3 A4 L9 L7 L4 A1 L8 | L10 A2 L4 L5 L11 L1 A3 | L1 A3 L10 | A4 L3 | L3 A4 | A1 L4 | A3 L1 | L1 A3 | A2 L4 | A4 L9 L3 | L4 A1 | L4 L7 L9 A1 | L1 L11 A3 | A2 L11 L5 L4 | L4 A2 | L12 A6 L3 | L3 A6 L13 A5 L6 L7 L12 | L14 L5 L6 A7 L15 L1 A8 | L1 A8 L14 | A6 L3 | L3 A6 | L7 L6 A5 L12 | A8 L1 | L1 A8 | L14 A7 L6 L5 | A6 L13 L3 | A5 L6 | L1 L15 A8 | A7 L6 | A5 L6 | L6 A7
equation "\"d16\" = t"
equation "\"d18\" = Q"
equation "\"d19\" = Q"
equation "\"d20\" = Q"
equation "\"d21\" = Q"
equation "\"d22\" = Q"
equation "\"d23\" = Q"
equation "\"d33\" = DF"
equation "\"d34\" = NF"
equation "\"d35\" = NF"
equation "\"d36\" = 0.5 * JF"
equation "\"d37\" = 0.5 * JF"
equation "\"d40\" = DM"
equation "\"d41\" = AM"
equation "\"d42\" = AM"
equation "\"d43\" = 0.5 * AM"
equation "\"d44\" = 0.5 * AM"
equation "\"d46\" = CM"
equation "\"d47\" = BM"
equation "\"d48\" = BM"
equation "\"d49\" = 0.5 * BM"
equation "\"d50\" = 0.5 * BM"
equation "\"d57\" = NM"
equation "\"d59\" = NM"
equation "\"d60\" = NM"
equation "\"d63\" = NM"
equation "\"d66\" = NM"
equation "\"d67\" = NM"
equation "\"d71\" = NM"
equation "\"d72\" = NM"
equation "\"d78\" = DM"
equation "\"d79\" = DM"
equation "\"t\" = 4.445"
equation "\"Q\" = 9.525"
equation "\"DF\" = 14.2875"
equation "\"NF\" = 12.7"
equation "\"DM\" = 11.1125"
equation "\"NM\" = 5.55625"
equation "\"CM\" = 93.4212"
equation "\"AM\" = 56"
equation "\"BM\" = 47.5"
equation "\"JF\" = 90"
properties part number "SIDE REDUCTION PLATE I"
